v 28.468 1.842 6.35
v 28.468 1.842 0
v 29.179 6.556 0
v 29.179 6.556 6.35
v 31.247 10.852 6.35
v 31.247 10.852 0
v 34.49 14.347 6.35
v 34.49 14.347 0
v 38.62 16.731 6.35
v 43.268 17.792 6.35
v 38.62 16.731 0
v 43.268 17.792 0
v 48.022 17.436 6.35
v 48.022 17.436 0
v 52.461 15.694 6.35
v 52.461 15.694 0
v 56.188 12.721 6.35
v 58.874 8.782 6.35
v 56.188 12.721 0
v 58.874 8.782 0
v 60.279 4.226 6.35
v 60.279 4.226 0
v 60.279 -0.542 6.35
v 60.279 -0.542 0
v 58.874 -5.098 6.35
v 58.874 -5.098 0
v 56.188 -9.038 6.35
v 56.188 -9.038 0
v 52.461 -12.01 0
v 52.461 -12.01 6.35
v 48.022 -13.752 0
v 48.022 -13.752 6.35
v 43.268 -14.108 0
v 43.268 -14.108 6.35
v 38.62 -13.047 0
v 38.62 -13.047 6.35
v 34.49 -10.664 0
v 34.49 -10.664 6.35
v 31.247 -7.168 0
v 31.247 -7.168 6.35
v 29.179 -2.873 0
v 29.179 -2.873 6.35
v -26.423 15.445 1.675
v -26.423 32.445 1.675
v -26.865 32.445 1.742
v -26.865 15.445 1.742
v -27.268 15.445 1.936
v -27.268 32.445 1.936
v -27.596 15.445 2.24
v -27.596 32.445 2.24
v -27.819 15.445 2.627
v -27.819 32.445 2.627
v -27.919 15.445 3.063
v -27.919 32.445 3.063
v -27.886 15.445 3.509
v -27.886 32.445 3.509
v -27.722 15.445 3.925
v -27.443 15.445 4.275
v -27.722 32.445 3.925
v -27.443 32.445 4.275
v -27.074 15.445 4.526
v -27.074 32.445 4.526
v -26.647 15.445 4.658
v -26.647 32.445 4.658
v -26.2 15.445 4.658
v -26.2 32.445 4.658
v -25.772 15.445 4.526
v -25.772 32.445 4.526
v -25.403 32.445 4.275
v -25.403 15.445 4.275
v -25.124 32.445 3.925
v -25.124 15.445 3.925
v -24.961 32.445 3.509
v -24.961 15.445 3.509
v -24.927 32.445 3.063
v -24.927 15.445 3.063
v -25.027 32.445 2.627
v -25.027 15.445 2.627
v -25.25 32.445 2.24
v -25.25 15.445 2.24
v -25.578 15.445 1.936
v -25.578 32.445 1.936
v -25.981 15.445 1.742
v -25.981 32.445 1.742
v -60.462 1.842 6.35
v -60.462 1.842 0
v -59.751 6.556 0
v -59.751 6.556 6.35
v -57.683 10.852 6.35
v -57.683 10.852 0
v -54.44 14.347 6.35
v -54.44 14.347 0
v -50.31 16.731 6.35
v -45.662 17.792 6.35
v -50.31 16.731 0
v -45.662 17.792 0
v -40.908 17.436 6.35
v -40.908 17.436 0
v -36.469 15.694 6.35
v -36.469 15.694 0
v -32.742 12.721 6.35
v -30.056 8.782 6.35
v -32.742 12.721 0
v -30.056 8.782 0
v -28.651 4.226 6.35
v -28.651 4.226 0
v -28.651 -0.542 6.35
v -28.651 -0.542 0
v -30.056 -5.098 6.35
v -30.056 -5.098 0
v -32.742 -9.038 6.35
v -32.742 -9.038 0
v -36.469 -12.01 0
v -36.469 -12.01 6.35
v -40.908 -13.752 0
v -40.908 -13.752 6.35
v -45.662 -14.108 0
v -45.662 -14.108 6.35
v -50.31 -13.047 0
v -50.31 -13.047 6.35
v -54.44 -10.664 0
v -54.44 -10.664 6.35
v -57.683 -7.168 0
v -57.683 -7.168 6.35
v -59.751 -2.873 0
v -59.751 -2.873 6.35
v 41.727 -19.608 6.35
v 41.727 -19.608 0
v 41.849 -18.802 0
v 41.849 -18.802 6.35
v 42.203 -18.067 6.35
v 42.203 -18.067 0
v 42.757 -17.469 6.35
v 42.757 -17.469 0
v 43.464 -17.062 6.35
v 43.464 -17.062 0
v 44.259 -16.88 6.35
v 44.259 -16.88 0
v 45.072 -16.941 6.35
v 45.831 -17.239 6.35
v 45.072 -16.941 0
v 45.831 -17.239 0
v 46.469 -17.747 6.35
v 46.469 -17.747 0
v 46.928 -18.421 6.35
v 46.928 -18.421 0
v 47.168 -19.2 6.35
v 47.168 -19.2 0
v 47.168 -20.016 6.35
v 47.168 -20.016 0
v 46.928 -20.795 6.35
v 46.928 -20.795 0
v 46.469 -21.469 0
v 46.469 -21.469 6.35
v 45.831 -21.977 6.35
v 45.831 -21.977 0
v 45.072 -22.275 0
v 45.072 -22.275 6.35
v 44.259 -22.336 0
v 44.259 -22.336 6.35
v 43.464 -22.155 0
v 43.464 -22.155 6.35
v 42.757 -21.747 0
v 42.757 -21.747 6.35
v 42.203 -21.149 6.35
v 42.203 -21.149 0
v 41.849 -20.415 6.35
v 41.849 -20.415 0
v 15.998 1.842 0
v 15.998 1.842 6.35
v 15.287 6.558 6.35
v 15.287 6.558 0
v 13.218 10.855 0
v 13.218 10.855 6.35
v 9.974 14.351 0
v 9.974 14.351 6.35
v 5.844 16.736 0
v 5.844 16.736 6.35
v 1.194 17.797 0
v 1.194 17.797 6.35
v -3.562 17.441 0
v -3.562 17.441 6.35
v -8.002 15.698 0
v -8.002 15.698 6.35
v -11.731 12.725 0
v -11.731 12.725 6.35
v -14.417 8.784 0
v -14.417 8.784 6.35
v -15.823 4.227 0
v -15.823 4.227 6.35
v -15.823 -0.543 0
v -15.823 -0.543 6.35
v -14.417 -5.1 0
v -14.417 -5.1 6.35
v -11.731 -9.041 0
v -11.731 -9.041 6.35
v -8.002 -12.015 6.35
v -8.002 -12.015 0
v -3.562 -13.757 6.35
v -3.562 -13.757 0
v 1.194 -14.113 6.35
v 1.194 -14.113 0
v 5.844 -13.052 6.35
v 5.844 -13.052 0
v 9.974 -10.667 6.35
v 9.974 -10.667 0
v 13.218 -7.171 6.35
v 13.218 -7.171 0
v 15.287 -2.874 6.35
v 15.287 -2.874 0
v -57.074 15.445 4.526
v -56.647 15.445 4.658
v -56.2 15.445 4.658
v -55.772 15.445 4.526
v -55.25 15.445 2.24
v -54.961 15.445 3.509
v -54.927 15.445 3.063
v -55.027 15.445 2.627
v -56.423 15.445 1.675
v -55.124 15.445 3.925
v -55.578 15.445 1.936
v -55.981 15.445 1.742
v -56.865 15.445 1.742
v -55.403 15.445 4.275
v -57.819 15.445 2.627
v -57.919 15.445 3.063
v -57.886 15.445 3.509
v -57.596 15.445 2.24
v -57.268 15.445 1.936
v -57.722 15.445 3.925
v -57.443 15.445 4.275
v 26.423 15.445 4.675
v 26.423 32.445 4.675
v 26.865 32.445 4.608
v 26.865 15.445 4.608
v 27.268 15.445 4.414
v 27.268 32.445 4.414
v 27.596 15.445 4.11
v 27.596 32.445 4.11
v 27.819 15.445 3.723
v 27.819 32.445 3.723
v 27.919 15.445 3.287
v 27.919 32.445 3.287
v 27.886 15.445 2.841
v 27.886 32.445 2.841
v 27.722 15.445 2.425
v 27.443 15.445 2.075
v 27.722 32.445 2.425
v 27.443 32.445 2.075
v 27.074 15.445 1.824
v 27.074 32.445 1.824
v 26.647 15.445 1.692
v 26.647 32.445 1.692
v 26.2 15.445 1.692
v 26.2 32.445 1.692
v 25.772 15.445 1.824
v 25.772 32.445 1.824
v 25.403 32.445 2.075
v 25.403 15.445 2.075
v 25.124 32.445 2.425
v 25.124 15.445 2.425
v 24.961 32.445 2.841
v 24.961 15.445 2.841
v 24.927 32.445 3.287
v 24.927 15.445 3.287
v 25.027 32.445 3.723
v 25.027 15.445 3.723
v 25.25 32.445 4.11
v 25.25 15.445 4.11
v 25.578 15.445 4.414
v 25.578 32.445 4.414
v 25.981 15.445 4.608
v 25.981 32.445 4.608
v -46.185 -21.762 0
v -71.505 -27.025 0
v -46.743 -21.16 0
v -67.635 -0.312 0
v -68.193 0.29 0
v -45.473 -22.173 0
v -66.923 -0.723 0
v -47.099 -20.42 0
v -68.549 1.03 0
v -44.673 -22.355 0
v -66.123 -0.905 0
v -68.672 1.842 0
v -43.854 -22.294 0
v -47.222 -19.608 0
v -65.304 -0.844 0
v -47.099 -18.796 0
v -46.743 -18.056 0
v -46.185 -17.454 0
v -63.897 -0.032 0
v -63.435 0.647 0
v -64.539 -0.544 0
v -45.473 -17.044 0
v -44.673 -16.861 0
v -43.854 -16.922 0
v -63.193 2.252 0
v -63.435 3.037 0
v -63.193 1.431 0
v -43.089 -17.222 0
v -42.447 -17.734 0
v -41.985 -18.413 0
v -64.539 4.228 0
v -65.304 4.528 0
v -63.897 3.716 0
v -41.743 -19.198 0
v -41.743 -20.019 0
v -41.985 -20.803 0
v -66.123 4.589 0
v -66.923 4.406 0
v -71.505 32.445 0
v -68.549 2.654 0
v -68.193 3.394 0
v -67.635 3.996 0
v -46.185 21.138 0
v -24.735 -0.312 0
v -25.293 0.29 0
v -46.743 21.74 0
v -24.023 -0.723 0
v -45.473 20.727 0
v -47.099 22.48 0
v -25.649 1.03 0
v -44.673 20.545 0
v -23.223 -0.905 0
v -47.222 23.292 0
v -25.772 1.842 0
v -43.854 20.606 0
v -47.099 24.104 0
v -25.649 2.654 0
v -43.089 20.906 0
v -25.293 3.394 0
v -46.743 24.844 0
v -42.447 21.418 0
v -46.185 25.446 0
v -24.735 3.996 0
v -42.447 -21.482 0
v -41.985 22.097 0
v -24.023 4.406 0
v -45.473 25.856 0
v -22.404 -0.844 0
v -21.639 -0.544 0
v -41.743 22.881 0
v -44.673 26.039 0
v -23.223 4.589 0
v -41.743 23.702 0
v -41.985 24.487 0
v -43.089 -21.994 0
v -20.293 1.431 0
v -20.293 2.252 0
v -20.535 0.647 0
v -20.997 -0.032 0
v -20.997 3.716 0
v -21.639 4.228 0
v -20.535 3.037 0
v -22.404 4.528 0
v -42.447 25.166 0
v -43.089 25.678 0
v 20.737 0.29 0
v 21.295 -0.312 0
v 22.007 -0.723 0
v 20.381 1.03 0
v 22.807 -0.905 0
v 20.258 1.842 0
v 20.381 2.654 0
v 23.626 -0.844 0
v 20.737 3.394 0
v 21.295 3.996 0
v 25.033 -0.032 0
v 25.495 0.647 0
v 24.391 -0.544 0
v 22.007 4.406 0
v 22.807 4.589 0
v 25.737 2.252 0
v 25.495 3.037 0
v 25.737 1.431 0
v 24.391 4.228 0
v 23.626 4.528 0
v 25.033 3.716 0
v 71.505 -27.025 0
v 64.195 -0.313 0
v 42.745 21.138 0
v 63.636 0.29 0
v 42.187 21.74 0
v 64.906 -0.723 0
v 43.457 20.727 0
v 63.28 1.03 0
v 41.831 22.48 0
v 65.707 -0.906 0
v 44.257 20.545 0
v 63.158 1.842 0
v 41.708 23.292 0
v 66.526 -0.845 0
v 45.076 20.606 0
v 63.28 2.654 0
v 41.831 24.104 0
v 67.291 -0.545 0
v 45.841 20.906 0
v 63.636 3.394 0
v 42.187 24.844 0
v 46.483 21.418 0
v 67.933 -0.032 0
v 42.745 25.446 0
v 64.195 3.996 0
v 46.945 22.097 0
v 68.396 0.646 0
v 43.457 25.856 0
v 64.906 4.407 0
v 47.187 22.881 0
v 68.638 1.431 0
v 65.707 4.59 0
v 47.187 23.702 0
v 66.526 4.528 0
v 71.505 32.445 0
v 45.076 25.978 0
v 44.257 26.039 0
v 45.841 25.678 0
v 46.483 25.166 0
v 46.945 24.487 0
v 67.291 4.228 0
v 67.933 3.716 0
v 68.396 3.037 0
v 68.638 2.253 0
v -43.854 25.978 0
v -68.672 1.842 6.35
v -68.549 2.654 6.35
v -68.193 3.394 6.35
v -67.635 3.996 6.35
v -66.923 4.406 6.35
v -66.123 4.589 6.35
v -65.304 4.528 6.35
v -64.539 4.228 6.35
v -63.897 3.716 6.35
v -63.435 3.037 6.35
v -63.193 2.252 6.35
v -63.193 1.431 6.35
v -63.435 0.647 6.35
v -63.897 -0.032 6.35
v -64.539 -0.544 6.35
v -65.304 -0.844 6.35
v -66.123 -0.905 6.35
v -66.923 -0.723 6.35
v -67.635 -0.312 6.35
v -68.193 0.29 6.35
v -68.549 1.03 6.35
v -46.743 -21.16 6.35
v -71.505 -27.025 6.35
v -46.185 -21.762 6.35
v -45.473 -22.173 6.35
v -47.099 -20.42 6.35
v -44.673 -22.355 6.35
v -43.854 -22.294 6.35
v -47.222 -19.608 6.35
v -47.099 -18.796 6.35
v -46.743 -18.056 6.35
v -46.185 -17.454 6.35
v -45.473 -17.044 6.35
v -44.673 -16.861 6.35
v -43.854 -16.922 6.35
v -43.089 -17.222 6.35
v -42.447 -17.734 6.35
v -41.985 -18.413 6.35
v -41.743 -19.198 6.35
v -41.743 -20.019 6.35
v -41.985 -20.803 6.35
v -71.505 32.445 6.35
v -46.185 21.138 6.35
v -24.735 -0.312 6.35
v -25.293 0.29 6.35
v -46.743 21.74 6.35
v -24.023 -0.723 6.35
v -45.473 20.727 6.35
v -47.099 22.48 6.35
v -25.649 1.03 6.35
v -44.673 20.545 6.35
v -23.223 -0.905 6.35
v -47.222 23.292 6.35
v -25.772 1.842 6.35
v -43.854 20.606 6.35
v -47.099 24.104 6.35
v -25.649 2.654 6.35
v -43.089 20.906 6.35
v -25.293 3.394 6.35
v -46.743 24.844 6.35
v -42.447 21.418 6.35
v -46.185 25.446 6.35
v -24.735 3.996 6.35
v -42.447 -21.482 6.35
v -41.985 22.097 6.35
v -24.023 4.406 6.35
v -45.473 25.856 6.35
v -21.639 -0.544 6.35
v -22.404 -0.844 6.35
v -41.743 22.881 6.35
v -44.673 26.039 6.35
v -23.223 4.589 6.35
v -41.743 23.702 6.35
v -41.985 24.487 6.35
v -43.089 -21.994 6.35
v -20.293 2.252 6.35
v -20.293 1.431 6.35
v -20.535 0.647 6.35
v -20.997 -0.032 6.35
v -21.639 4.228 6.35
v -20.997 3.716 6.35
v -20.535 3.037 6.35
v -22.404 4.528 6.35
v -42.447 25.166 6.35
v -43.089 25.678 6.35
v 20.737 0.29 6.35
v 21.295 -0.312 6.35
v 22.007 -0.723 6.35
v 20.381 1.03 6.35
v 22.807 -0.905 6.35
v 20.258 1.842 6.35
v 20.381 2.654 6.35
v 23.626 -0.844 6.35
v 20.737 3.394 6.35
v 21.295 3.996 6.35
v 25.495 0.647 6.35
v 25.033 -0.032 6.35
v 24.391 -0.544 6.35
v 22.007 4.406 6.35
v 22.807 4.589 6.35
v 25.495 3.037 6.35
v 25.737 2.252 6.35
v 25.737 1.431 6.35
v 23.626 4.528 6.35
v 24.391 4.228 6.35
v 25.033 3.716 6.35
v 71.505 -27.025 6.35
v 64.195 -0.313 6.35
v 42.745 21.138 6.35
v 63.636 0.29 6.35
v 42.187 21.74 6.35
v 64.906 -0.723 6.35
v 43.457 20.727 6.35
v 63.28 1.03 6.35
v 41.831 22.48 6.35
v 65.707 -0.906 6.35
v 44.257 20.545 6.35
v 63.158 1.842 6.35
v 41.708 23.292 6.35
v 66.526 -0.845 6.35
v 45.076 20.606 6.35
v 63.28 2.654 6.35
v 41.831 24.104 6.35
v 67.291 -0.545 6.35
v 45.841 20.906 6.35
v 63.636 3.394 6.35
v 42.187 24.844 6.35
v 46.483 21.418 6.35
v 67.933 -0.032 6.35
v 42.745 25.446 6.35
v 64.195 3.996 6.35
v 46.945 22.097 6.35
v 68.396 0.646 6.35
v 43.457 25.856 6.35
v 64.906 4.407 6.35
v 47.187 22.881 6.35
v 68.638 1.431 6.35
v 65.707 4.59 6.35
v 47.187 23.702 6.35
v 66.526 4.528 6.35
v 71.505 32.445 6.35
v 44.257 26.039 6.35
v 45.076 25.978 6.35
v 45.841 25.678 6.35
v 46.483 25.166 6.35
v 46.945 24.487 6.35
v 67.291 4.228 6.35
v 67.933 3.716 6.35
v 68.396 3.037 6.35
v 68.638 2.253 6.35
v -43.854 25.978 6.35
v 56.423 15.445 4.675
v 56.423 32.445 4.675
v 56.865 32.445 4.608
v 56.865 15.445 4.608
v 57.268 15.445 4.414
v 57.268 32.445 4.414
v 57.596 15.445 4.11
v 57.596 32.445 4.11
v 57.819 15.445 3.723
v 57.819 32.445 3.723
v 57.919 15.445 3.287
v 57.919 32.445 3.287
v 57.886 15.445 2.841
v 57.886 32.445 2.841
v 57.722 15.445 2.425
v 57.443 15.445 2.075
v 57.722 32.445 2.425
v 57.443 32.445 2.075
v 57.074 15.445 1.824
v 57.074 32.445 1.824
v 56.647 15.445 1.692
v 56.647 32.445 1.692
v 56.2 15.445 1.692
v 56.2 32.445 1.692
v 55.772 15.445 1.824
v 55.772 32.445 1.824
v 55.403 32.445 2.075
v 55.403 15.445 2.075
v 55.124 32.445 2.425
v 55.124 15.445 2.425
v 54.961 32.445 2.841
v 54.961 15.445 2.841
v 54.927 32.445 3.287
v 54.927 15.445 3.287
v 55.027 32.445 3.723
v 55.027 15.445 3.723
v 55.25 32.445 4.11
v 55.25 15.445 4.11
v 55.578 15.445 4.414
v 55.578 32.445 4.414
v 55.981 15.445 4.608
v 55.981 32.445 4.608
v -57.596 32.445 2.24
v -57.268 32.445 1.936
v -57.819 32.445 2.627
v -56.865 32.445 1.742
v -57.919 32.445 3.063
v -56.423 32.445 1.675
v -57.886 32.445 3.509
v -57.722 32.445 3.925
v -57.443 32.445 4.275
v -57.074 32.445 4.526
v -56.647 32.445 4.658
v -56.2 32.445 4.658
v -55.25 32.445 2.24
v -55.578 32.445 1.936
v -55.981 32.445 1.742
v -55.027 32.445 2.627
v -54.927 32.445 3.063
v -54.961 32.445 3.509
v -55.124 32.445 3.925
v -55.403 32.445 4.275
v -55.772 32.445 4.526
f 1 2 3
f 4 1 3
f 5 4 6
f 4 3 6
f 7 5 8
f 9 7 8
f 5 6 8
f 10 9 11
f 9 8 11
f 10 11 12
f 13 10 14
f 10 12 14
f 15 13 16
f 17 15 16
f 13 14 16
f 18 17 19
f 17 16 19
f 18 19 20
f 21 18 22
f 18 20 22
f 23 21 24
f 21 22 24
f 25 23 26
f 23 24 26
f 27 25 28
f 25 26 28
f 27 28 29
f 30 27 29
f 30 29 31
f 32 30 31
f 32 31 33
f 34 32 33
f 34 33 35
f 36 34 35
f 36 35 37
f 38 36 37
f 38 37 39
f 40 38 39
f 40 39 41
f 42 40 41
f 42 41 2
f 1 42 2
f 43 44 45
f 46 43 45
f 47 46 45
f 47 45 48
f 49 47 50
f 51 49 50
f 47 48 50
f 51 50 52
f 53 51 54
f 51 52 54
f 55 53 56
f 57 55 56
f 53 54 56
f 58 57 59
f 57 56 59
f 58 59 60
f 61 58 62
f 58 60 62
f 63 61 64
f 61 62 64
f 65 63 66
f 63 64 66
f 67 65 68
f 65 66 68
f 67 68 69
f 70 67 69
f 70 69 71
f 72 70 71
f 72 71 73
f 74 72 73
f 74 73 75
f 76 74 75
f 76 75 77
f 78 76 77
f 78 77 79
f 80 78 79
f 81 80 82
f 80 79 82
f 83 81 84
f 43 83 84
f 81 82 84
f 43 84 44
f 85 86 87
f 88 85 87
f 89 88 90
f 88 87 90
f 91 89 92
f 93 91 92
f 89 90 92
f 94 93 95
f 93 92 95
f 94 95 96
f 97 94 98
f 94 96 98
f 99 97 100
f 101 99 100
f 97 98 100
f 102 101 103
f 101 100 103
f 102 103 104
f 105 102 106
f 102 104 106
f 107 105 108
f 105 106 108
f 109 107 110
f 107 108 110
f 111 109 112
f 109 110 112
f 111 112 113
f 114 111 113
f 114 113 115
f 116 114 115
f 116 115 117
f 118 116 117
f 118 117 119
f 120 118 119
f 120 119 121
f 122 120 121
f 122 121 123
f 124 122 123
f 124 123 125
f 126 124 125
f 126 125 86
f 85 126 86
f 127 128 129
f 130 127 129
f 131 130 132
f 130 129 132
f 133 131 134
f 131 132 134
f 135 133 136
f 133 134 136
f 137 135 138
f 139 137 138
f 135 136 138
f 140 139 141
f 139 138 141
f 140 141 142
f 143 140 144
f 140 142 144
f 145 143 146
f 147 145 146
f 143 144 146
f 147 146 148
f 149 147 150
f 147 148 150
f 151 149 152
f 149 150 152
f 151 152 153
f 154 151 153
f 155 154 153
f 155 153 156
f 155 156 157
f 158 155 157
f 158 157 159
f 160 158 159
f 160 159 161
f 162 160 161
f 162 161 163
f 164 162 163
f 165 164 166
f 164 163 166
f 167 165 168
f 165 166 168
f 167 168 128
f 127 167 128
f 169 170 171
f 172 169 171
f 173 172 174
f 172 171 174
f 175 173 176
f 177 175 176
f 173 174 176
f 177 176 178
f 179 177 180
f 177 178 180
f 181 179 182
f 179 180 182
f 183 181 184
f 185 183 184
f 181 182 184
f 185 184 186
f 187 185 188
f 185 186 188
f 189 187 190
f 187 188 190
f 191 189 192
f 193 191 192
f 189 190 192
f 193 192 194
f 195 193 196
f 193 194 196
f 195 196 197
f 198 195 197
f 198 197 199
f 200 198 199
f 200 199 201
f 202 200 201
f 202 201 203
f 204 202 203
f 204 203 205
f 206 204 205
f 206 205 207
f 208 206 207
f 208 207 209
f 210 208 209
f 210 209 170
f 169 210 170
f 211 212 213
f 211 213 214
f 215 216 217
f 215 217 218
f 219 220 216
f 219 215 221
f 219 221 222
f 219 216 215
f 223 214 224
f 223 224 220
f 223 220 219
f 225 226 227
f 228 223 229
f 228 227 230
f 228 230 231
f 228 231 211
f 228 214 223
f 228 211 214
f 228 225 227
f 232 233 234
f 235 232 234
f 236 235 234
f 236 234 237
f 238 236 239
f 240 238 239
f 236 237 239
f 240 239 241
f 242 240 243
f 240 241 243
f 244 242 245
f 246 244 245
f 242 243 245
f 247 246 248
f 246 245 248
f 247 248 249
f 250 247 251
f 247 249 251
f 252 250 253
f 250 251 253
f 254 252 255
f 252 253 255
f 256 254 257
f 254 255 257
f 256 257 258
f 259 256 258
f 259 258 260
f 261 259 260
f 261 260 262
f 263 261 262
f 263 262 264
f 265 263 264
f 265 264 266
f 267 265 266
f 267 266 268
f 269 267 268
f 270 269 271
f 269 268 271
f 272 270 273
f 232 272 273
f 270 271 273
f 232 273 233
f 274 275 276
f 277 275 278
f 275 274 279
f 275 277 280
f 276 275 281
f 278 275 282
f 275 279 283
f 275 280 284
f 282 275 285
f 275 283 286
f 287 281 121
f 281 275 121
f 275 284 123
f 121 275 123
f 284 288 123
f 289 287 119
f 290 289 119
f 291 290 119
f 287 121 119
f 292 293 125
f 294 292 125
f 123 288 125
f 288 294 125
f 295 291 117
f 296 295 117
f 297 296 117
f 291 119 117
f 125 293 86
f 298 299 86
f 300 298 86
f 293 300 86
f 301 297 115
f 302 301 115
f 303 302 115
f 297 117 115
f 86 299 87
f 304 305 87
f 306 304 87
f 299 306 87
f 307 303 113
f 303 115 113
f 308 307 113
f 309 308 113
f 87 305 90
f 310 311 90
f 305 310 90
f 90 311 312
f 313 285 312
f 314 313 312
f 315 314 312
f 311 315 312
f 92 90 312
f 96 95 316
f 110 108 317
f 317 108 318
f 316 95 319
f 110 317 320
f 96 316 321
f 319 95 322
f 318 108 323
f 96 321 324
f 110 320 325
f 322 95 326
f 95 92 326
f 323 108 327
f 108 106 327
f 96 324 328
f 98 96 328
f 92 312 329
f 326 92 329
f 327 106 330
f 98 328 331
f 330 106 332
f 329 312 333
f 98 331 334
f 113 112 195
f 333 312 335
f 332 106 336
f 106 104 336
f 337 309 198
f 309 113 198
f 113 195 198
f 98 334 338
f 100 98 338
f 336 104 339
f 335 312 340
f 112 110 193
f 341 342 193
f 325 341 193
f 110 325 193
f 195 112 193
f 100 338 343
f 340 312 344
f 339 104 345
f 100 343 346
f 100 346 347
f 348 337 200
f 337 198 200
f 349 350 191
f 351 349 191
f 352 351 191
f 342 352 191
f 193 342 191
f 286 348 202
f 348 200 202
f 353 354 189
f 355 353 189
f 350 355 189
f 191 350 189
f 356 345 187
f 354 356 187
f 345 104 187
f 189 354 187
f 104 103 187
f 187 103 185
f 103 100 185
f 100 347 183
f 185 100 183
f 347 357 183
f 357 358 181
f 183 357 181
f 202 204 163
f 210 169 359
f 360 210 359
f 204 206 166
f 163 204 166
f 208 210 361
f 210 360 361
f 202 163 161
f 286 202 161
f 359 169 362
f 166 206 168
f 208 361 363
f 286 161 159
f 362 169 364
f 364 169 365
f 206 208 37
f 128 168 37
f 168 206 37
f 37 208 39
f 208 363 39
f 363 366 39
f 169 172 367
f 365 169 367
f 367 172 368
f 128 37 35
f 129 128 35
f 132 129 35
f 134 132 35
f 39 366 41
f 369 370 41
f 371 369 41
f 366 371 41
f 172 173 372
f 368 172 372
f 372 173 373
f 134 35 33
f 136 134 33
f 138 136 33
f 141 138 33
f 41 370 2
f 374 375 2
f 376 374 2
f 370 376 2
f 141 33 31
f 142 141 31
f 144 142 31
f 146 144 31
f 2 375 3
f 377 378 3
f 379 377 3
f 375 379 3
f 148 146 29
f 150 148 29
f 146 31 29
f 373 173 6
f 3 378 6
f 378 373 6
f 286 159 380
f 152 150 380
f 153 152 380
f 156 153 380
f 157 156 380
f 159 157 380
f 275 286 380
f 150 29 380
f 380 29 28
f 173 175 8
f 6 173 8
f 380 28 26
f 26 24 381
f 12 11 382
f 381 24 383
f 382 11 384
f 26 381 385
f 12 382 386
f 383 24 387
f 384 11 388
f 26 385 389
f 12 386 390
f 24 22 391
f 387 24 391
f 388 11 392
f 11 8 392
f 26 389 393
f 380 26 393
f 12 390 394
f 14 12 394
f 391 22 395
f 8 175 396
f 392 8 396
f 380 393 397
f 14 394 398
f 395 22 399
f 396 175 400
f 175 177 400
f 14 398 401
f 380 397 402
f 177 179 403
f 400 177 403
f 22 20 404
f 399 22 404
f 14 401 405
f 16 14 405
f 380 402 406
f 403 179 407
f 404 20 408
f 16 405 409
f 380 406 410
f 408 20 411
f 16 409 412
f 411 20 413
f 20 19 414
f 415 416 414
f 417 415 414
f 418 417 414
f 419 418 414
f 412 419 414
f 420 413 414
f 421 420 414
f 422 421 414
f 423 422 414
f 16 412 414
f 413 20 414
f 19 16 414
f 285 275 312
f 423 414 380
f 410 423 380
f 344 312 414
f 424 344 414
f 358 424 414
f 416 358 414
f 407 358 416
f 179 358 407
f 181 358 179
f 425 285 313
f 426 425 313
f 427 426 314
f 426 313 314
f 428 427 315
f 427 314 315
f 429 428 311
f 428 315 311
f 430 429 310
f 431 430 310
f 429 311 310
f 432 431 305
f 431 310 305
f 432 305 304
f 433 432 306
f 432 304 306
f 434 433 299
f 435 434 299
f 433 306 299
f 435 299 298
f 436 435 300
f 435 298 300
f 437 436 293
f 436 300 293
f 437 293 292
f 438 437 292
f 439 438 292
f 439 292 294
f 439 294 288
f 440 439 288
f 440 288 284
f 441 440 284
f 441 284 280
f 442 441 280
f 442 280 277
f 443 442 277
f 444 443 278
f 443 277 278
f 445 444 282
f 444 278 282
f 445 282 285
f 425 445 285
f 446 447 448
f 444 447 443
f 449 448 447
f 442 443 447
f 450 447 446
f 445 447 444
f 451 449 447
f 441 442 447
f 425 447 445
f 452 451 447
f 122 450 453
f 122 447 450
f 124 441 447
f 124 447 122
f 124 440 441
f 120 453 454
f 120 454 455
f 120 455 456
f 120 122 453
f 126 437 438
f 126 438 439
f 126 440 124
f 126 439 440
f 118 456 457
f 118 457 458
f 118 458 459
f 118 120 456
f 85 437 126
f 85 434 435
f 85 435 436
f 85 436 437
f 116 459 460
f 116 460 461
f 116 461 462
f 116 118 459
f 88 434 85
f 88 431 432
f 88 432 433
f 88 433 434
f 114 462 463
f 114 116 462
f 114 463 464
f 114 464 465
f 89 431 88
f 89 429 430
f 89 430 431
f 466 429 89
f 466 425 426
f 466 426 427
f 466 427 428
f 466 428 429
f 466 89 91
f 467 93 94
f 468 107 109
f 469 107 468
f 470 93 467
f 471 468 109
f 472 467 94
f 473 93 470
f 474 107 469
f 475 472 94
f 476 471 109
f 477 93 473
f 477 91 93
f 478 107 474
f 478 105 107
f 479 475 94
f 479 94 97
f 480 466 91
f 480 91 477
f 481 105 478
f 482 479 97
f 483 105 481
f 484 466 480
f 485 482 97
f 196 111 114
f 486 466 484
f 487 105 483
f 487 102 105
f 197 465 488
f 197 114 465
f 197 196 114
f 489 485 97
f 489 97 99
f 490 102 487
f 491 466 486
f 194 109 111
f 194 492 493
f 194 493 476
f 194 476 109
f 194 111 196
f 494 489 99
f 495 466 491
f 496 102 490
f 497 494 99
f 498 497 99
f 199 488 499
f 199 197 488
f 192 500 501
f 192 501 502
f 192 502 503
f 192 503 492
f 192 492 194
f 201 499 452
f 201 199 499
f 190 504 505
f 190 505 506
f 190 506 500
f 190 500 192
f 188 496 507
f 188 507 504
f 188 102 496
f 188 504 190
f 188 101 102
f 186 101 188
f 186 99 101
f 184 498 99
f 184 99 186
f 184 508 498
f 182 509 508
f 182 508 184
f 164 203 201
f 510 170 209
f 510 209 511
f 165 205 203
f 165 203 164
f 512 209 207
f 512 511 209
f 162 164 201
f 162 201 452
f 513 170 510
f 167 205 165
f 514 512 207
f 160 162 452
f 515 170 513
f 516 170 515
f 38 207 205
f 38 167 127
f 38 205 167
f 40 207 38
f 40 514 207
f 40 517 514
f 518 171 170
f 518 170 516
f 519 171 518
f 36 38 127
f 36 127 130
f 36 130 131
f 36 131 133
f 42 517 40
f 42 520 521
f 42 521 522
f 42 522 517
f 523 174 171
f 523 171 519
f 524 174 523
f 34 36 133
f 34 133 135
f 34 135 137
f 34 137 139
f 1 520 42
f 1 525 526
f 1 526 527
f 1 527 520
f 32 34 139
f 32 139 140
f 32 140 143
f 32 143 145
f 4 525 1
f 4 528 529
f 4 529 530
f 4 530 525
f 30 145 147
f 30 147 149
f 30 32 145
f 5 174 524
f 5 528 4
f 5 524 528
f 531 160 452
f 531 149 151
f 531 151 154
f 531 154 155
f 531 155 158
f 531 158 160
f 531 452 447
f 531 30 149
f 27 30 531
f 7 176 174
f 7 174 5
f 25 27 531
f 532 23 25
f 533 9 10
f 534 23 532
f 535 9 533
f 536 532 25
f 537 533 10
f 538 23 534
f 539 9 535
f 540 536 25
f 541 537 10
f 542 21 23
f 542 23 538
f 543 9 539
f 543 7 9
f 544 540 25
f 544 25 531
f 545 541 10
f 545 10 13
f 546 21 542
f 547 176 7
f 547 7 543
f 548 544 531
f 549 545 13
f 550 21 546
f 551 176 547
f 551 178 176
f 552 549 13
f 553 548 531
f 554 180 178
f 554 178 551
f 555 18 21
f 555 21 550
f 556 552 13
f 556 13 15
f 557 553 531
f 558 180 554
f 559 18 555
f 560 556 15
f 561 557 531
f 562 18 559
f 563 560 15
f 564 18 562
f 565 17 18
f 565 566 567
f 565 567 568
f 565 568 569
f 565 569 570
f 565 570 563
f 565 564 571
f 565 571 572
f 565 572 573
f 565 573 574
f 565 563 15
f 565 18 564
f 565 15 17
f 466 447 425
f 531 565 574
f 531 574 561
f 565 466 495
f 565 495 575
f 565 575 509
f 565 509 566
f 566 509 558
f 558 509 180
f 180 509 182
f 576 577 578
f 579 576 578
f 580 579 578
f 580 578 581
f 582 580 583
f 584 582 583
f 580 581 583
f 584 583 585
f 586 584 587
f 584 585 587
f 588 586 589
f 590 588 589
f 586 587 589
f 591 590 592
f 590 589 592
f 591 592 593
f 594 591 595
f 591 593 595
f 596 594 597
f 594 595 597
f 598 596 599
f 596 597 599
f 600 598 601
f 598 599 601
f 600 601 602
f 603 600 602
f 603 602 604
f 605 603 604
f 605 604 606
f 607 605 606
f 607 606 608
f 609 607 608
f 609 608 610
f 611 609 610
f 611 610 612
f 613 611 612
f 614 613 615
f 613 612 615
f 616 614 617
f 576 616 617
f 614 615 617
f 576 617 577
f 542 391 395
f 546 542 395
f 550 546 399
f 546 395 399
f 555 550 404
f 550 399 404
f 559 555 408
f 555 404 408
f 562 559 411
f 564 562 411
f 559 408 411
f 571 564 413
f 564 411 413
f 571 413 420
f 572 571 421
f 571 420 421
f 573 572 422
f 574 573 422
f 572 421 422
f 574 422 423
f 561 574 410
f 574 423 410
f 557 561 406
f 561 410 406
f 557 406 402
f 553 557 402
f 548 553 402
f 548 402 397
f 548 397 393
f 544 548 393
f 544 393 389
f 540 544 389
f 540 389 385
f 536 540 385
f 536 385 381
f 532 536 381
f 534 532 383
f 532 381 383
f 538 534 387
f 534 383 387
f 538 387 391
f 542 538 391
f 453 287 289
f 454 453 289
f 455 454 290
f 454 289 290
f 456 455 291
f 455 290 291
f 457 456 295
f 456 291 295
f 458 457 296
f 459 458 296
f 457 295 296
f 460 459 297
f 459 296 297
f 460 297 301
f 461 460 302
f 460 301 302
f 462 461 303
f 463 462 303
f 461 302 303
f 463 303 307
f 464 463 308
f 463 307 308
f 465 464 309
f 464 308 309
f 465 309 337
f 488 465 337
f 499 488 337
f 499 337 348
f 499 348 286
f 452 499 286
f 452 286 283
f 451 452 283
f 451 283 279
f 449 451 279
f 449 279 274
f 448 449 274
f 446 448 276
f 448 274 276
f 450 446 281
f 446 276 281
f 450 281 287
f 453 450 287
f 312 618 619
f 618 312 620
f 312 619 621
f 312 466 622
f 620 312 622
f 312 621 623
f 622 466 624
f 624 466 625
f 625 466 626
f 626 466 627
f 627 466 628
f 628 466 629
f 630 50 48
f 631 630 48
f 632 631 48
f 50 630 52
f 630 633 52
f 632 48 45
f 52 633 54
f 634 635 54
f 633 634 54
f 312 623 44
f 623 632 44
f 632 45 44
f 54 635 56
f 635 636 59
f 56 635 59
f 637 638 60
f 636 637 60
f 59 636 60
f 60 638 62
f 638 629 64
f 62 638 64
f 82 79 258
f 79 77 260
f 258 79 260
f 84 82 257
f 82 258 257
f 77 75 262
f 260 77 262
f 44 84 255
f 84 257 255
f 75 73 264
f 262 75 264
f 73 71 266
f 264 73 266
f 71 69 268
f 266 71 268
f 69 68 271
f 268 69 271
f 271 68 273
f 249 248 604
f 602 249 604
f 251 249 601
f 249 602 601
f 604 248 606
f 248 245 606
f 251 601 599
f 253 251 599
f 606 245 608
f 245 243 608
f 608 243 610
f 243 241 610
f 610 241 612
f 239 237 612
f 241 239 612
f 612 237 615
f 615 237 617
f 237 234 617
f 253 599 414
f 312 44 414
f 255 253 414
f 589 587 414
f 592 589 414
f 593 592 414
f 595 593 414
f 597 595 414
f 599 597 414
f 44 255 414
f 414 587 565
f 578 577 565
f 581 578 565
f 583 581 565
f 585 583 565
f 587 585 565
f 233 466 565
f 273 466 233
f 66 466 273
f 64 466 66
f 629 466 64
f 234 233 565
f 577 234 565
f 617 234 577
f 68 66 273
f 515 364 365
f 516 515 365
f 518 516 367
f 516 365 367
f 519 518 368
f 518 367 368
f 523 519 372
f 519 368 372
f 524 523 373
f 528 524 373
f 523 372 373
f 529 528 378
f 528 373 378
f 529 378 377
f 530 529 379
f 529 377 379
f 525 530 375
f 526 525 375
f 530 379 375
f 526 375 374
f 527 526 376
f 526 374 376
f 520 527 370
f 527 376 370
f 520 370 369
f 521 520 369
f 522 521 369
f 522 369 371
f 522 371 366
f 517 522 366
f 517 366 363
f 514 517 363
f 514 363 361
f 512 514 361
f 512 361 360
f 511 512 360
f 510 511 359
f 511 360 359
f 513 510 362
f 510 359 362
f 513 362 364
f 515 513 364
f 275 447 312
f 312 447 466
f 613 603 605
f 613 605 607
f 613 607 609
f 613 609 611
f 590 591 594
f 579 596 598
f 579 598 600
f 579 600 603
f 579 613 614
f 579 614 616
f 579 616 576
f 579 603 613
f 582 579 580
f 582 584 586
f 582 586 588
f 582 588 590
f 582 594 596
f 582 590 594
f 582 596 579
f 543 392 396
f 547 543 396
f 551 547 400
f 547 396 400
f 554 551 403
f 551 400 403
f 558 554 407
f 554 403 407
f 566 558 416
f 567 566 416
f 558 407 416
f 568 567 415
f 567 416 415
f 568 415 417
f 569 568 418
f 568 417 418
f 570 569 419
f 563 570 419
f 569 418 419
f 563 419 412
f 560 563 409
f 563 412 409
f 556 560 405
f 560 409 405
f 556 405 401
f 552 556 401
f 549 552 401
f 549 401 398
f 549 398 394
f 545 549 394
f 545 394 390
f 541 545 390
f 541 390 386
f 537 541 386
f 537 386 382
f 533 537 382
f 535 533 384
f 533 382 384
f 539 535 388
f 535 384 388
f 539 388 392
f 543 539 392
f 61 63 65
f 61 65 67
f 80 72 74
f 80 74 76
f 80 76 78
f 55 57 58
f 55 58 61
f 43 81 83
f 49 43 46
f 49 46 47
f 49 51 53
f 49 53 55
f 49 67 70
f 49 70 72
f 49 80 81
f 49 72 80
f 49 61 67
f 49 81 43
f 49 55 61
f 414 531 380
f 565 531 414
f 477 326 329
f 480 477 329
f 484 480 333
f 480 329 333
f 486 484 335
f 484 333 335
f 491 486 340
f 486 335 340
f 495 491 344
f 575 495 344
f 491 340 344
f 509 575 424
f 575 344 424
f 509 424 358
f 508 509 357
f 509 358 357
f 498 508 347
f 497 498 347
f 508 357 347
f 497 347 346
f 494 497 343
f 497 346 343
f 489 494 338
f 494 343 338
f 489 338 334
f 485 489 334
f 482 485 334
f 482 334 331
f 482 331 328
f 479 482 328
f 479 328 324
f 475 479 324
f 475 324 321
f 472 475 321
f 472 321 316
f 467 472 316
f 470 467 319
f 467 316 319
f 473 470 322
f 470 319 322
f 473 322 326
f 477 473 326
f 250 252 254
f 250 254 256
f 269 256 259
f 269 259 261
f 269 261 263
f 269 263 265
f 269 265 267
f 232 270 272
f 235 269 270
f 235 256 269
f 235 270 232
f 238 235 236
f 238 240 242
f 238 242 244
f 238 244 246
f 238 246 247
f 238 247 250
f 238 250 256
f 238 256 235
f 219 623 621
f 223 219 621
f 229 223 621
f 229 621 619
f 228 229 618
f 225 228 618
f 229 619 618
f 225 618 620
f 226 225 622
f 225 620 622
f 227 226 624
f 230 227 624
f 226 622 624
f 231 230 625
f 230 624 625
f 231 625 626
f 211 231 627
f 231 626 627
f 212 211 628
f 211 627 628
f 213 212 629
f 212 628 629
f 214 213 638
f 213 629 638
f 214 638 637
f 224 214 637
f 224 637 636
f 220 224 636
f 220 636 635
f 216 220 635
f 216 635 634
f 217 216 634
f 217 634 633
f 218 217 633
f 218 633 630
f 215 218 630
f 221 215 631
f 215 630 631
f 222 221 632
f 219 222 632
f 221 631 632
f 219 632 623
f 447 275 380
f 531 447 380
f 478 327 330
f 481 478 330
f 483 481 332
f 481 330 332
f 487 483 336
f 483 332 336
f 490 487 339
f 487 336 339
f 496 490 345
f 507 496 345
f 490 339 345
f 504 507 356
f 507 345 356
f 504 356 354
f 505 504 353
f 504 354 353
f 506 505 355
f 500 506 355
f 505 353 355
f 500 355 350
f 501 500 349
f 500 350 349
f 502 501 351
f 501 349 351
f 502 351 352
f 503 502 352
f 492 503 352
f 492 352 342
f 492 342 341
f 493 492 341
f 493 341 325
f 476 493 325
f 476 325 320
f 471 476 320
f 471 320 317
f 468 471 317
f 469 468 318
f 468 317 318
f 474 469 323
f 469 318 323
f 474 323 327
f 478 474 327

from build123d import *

# Parameters (mm, degrees)
ESBO_O1_W                = 143.01
ESBO_O1_H                = 54.05
RESSALTO_EXTRUS_O1_DEPTH = 6.35
ESBO_O2_R                = 2.755
ESBO_O2_R_2              = 2.755565393
ESBO_O2_R_3              = 2.735691737
CORTE_EXTRUS_O1_DEPTH    = 6.35
ESBO_O3_R                = 15.995
ESBO_O3_R_2              = 10
CORTE_EXTRUS_O2_DEPTH    = 10
ESBO_O4_W                = 143.01
ESBO_O4_H                = 3.42
RESSALTO_EXTRUS_O2_DEPTH = 6.35
ESBO_O5_R                = 16
CORTE_EXTRUS_O3_DEPTH    = 10
CROQUIS1_W               = 143.01
CROQUIS1_H               = 2
SALIENTE_EXTRUIR2_DEPTH  = 6.35
ESBO_O6_R                = 1.5
CORTE_EXTRUS_O4_DEPTH    = 17


with BuildPart() as part:
    # Esboço1 → Ressalto-extrusão1 (new body)
    with BuildSketch(Plane.XY):
        Rectangle(ESBO_O1_W, ESBO_O1_H)
    extrude(amount=RESSALTO_EXTRUS_O1_DEPTH)

    # Esboço2 → Corte-extrusão1 (cut)
    with BuildSketch(Plane(origin=(0, 0, 0), x_dir=(-1, 0, 0), z_dir=(0, 0, -1))):
        with Locations((-44.463136928, 23.291850449)):
            Circle(ESBO_O2_R)
        with Locations((-65.913136928, 1.841850449)):
            Circle(ESBO_O2_R_2)
        with Locations((-44.463136928, -19.608149551)):
            Circle(ESBO_O2_R_3)
        with Locations((-23.013136928, 1.841850449)):
            Circle(ESBO_O2_R)
        with Locations((23.016863072, 1.841850449)):
            Circle(ESBO_O2_R)
        with Locations((44.466863072, -19.608149551)):
            Circle(ESBO_O2_R)
        with Locations((65.916863072, 1.841850449)):
            Circle(ESBO_O2_R)
        with Locations((44.466863072, 23.291850449)):
            Circle(ESBO_O2_R)
    extrude(amount=-CORTE_EXTRUS_O1_DEPTH, mode=Mode.SUBTRACT)

    # Esboço3 → Corte-extrusão2 (cut)
    with BuildSketch(Plane(origin=(0, 0, 0), x_dir=(-1, 0, 0), z_dir=(0, 0, -1))):
        with Locations((-44.463136928, 1.841850449)):
            Circle(ESBO_O3_R)
        with Locations((0.001863072, 1.841850449)):
            Circle(ESBO_O3_R_2)
        with Locations((44.466863072, 1.841850449)):
            Circle(ESBO_O3_R)
    extrude(amount=-CORTE_EXTRUS_O2_DEPTH, mode=Mode.SUBTRACT)

    # Esboço4 → Ressalto-extrusão2 (add)
    with BuildSketch(Plane.XY):
        with Locations((0, 28.735)):
            Rectangle(ESBO_O4_W, ESBO_O4_H)
    extrude(amount=RESSALTO_EXTRUS_O2_DEPTH)

    # Esboço5 → Corte-extrusão3 (cut)
    with BuildSketch(Plane.XY.offset(6.35)):
        with Locations((-0.001863072, 1.841850449)):
            Circle(ESBO_O5_R)
    extrude(amount=-CORTE_EXTRUS_O3_DEPTH, mode=Mode.SUBTRACT)

    # Croquis1 → Saliente-Extruir2 (add)
    with BuildSketch(Plane.XY.offset(6.35)):
        with Locations((0, 31.445)):
            Rectangle(CROQUIS1_W, CROQUIS1_H)
    extrude(amount=-SALIENTE_EXTRUIR2_DEPTH)

    # Esboço6 → Corte-extrusão4 (cut)
    with BuildSketch(Plane(origin=(0, 32.445, 0), x_dir=(1, 0, 0), z_dir=(0, 1, 0))):
        with Locations(Location((56.423186497, -3.175, 0), (0, 0, 270))):
            Circle(ESBO_O6_R)
        with Locations(Location((26.423186497, -3.175, 0), (0, 0, 270))):
            Circle(ESBO_O6_R)
        with Locations(Location((-26.423186497, -3.175, 0), (0, 0, 90))):
            Circle(ESBO_O6_R)
        with Locations(Location((-56.423186497, -3.175, 0), (0, 0, 90))):
            Circle(ESBO_O6_R)
    extrude(amount=-CORTE_EXTRUS_O4_DEPTH, mode=Mode.SUBTRACT)


solid = part.part
